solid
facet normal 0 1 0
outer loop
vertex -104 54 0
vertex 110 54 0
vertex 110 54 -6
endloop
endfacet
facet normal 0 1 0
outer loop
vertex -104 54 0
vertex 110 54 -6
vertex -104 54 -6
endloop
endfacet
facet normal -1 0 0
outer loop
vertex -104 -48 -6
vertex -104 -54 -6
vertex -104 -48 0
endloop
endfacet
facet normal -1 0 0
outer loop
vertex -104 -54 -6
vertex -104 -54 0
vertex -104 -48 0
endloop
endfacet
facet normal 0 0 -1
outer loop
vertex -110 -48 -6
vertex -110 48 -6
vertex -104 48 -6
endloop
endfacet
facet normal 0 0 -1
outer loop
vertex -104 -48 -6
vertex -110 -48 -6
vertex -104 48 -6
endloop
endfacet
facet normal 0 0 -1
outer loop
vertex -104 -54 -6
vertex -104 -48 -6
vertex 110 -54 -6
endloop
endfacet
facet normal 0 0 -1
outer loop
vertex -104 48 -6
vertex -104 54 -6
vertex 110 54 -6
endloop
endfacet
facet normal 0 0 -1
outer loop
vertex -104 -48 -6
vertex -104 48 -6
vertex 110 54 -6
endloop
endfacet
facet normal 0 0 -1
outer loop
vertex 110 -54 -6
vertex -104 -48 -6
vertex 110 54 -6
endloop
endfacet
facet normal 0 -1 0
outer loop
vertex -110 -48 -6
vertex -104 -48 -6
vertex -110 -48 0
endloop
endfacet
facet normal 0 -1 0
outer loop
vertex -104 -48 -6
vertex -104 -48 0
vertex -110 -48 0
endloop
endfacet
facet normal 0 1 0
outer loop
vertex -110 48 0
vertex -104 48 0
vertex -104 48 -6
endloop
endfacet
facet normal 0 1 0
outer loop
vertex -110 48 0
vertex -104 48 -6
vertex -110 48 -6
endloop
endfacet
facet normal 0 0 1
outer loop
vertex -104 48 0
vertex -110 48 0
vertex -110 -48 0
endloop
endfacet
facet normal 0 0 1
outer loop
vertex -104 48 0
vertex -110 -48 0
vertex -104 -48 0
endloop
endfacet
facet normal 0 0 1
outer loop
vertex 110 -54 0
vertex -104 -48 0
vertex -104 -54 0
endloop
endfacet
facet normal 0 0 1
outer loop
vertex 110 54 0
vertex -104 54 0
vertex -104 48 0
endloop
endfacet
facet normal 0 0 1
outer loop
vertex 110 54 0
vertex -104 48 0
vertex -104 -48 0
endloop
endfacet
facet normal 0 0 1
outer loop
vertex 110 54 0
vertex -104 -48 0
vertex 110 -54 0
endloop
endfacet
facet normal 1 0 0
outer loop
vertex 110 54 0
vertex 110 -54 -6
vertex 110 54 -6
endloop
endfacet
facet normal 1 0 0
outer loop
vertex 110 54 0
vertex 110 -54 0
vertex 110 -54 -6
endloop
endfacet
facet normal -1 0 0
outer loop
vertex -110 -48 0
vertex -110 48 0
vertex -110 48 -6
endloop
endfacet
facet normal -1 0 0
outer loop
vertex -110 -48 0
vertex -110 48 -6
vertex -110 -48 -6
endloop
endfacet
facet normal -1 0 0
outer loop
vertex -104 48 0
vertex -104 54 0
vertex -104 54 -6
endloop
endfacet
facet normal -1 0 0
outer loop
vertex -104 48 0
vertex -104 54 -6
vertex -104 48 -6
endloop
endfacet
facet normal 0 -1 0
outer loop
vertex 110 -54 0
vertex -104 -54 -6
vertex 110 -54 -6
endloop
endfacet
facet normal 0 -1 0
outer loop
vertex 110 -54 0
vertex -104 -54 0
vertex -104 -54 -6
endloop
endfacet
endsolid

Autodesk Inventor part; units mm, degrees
ref_plane "YZ Plane" through (0, 0, 0) normal (1, 0, 0) x (0, 1, 0)
ref_plane "XZ Plane" through (0, 0, 0) normal (0, 1, 0) x (-1, 0, 0)
ref_plane "XY Plane" through (0, 0, 0) normal (0, 0, 1) x (1, 0, 0)
sketch "Skizze1" plane through (0, 0, 0) normal (0, 0, 1) x (1, 0, 0)
  line L0 (-154, 0) -> (154, 0) projected
  line L1 (0, -75.6) -> (0, 75.6) projected
  line L2 (-110, -54) -> (110, -54)
  line L3 (110, -54) -> (110, 54)
  line L4 (110, 54) -> (-110, 54)
  line L5 (-110, 54) -> (-110, -54)
  line L6 (-110, -54) -> (110, 54) construction
  line L7 (110, -54) -> (-110, 54) construction
  point P0 (0, 0)
  dimension "d0" = 220
  dimension "d1" = 108
extrude "Extrusion1" add sketch "Skizze1" against normal blind 6
sketch "Skizze2" plane through (0, 0, 0) normal (0, 0, 1) x (1, 0, 0)
  line L0 (-110, -54) -> (110, -54) projected
  line L1 (110, -54) -> (110, 54) projected
  line L2 (110, 54) -> (-110, 54) projected
  line L3 (-110, 54) -> (-110, -54) projected
  line L4 (-154, 0) -> (154, 0) projected
  line L5 (0, -75.6) -> (0, 75.6) projected
  line L6 (-110, -54) -> (-110, 54) projected
  line L7 (-110, 54) -> (-104, 54)
  line L8 (-104, 54) -> (-104, 48)
  line L9 (-104, 48) -> (-110, 48)
  line L10 (-110, 48) -> (-110, 54)
  line L11 (-110, -54) -> (-104, -54)
  line L12 (-104, -54) -> (-104, -48)
  line L13 (-104, -48) -> (-110, -48)
  line L14 (-110, -48) -> (-110, -54)
  point P0 (0, 0)
  dimension "d4" = 6
  dimension "d5" = 6
  dimension "d6" = 6
  dimension "d7" = 6
extrude "Extrusion2" cut sketch "Skizze2" against normal blind 6 contours L3 L13 L12 L0 | L3 L2 L8 L9
properties part number "II Bodenplatte lang" material "PVC, hart"
